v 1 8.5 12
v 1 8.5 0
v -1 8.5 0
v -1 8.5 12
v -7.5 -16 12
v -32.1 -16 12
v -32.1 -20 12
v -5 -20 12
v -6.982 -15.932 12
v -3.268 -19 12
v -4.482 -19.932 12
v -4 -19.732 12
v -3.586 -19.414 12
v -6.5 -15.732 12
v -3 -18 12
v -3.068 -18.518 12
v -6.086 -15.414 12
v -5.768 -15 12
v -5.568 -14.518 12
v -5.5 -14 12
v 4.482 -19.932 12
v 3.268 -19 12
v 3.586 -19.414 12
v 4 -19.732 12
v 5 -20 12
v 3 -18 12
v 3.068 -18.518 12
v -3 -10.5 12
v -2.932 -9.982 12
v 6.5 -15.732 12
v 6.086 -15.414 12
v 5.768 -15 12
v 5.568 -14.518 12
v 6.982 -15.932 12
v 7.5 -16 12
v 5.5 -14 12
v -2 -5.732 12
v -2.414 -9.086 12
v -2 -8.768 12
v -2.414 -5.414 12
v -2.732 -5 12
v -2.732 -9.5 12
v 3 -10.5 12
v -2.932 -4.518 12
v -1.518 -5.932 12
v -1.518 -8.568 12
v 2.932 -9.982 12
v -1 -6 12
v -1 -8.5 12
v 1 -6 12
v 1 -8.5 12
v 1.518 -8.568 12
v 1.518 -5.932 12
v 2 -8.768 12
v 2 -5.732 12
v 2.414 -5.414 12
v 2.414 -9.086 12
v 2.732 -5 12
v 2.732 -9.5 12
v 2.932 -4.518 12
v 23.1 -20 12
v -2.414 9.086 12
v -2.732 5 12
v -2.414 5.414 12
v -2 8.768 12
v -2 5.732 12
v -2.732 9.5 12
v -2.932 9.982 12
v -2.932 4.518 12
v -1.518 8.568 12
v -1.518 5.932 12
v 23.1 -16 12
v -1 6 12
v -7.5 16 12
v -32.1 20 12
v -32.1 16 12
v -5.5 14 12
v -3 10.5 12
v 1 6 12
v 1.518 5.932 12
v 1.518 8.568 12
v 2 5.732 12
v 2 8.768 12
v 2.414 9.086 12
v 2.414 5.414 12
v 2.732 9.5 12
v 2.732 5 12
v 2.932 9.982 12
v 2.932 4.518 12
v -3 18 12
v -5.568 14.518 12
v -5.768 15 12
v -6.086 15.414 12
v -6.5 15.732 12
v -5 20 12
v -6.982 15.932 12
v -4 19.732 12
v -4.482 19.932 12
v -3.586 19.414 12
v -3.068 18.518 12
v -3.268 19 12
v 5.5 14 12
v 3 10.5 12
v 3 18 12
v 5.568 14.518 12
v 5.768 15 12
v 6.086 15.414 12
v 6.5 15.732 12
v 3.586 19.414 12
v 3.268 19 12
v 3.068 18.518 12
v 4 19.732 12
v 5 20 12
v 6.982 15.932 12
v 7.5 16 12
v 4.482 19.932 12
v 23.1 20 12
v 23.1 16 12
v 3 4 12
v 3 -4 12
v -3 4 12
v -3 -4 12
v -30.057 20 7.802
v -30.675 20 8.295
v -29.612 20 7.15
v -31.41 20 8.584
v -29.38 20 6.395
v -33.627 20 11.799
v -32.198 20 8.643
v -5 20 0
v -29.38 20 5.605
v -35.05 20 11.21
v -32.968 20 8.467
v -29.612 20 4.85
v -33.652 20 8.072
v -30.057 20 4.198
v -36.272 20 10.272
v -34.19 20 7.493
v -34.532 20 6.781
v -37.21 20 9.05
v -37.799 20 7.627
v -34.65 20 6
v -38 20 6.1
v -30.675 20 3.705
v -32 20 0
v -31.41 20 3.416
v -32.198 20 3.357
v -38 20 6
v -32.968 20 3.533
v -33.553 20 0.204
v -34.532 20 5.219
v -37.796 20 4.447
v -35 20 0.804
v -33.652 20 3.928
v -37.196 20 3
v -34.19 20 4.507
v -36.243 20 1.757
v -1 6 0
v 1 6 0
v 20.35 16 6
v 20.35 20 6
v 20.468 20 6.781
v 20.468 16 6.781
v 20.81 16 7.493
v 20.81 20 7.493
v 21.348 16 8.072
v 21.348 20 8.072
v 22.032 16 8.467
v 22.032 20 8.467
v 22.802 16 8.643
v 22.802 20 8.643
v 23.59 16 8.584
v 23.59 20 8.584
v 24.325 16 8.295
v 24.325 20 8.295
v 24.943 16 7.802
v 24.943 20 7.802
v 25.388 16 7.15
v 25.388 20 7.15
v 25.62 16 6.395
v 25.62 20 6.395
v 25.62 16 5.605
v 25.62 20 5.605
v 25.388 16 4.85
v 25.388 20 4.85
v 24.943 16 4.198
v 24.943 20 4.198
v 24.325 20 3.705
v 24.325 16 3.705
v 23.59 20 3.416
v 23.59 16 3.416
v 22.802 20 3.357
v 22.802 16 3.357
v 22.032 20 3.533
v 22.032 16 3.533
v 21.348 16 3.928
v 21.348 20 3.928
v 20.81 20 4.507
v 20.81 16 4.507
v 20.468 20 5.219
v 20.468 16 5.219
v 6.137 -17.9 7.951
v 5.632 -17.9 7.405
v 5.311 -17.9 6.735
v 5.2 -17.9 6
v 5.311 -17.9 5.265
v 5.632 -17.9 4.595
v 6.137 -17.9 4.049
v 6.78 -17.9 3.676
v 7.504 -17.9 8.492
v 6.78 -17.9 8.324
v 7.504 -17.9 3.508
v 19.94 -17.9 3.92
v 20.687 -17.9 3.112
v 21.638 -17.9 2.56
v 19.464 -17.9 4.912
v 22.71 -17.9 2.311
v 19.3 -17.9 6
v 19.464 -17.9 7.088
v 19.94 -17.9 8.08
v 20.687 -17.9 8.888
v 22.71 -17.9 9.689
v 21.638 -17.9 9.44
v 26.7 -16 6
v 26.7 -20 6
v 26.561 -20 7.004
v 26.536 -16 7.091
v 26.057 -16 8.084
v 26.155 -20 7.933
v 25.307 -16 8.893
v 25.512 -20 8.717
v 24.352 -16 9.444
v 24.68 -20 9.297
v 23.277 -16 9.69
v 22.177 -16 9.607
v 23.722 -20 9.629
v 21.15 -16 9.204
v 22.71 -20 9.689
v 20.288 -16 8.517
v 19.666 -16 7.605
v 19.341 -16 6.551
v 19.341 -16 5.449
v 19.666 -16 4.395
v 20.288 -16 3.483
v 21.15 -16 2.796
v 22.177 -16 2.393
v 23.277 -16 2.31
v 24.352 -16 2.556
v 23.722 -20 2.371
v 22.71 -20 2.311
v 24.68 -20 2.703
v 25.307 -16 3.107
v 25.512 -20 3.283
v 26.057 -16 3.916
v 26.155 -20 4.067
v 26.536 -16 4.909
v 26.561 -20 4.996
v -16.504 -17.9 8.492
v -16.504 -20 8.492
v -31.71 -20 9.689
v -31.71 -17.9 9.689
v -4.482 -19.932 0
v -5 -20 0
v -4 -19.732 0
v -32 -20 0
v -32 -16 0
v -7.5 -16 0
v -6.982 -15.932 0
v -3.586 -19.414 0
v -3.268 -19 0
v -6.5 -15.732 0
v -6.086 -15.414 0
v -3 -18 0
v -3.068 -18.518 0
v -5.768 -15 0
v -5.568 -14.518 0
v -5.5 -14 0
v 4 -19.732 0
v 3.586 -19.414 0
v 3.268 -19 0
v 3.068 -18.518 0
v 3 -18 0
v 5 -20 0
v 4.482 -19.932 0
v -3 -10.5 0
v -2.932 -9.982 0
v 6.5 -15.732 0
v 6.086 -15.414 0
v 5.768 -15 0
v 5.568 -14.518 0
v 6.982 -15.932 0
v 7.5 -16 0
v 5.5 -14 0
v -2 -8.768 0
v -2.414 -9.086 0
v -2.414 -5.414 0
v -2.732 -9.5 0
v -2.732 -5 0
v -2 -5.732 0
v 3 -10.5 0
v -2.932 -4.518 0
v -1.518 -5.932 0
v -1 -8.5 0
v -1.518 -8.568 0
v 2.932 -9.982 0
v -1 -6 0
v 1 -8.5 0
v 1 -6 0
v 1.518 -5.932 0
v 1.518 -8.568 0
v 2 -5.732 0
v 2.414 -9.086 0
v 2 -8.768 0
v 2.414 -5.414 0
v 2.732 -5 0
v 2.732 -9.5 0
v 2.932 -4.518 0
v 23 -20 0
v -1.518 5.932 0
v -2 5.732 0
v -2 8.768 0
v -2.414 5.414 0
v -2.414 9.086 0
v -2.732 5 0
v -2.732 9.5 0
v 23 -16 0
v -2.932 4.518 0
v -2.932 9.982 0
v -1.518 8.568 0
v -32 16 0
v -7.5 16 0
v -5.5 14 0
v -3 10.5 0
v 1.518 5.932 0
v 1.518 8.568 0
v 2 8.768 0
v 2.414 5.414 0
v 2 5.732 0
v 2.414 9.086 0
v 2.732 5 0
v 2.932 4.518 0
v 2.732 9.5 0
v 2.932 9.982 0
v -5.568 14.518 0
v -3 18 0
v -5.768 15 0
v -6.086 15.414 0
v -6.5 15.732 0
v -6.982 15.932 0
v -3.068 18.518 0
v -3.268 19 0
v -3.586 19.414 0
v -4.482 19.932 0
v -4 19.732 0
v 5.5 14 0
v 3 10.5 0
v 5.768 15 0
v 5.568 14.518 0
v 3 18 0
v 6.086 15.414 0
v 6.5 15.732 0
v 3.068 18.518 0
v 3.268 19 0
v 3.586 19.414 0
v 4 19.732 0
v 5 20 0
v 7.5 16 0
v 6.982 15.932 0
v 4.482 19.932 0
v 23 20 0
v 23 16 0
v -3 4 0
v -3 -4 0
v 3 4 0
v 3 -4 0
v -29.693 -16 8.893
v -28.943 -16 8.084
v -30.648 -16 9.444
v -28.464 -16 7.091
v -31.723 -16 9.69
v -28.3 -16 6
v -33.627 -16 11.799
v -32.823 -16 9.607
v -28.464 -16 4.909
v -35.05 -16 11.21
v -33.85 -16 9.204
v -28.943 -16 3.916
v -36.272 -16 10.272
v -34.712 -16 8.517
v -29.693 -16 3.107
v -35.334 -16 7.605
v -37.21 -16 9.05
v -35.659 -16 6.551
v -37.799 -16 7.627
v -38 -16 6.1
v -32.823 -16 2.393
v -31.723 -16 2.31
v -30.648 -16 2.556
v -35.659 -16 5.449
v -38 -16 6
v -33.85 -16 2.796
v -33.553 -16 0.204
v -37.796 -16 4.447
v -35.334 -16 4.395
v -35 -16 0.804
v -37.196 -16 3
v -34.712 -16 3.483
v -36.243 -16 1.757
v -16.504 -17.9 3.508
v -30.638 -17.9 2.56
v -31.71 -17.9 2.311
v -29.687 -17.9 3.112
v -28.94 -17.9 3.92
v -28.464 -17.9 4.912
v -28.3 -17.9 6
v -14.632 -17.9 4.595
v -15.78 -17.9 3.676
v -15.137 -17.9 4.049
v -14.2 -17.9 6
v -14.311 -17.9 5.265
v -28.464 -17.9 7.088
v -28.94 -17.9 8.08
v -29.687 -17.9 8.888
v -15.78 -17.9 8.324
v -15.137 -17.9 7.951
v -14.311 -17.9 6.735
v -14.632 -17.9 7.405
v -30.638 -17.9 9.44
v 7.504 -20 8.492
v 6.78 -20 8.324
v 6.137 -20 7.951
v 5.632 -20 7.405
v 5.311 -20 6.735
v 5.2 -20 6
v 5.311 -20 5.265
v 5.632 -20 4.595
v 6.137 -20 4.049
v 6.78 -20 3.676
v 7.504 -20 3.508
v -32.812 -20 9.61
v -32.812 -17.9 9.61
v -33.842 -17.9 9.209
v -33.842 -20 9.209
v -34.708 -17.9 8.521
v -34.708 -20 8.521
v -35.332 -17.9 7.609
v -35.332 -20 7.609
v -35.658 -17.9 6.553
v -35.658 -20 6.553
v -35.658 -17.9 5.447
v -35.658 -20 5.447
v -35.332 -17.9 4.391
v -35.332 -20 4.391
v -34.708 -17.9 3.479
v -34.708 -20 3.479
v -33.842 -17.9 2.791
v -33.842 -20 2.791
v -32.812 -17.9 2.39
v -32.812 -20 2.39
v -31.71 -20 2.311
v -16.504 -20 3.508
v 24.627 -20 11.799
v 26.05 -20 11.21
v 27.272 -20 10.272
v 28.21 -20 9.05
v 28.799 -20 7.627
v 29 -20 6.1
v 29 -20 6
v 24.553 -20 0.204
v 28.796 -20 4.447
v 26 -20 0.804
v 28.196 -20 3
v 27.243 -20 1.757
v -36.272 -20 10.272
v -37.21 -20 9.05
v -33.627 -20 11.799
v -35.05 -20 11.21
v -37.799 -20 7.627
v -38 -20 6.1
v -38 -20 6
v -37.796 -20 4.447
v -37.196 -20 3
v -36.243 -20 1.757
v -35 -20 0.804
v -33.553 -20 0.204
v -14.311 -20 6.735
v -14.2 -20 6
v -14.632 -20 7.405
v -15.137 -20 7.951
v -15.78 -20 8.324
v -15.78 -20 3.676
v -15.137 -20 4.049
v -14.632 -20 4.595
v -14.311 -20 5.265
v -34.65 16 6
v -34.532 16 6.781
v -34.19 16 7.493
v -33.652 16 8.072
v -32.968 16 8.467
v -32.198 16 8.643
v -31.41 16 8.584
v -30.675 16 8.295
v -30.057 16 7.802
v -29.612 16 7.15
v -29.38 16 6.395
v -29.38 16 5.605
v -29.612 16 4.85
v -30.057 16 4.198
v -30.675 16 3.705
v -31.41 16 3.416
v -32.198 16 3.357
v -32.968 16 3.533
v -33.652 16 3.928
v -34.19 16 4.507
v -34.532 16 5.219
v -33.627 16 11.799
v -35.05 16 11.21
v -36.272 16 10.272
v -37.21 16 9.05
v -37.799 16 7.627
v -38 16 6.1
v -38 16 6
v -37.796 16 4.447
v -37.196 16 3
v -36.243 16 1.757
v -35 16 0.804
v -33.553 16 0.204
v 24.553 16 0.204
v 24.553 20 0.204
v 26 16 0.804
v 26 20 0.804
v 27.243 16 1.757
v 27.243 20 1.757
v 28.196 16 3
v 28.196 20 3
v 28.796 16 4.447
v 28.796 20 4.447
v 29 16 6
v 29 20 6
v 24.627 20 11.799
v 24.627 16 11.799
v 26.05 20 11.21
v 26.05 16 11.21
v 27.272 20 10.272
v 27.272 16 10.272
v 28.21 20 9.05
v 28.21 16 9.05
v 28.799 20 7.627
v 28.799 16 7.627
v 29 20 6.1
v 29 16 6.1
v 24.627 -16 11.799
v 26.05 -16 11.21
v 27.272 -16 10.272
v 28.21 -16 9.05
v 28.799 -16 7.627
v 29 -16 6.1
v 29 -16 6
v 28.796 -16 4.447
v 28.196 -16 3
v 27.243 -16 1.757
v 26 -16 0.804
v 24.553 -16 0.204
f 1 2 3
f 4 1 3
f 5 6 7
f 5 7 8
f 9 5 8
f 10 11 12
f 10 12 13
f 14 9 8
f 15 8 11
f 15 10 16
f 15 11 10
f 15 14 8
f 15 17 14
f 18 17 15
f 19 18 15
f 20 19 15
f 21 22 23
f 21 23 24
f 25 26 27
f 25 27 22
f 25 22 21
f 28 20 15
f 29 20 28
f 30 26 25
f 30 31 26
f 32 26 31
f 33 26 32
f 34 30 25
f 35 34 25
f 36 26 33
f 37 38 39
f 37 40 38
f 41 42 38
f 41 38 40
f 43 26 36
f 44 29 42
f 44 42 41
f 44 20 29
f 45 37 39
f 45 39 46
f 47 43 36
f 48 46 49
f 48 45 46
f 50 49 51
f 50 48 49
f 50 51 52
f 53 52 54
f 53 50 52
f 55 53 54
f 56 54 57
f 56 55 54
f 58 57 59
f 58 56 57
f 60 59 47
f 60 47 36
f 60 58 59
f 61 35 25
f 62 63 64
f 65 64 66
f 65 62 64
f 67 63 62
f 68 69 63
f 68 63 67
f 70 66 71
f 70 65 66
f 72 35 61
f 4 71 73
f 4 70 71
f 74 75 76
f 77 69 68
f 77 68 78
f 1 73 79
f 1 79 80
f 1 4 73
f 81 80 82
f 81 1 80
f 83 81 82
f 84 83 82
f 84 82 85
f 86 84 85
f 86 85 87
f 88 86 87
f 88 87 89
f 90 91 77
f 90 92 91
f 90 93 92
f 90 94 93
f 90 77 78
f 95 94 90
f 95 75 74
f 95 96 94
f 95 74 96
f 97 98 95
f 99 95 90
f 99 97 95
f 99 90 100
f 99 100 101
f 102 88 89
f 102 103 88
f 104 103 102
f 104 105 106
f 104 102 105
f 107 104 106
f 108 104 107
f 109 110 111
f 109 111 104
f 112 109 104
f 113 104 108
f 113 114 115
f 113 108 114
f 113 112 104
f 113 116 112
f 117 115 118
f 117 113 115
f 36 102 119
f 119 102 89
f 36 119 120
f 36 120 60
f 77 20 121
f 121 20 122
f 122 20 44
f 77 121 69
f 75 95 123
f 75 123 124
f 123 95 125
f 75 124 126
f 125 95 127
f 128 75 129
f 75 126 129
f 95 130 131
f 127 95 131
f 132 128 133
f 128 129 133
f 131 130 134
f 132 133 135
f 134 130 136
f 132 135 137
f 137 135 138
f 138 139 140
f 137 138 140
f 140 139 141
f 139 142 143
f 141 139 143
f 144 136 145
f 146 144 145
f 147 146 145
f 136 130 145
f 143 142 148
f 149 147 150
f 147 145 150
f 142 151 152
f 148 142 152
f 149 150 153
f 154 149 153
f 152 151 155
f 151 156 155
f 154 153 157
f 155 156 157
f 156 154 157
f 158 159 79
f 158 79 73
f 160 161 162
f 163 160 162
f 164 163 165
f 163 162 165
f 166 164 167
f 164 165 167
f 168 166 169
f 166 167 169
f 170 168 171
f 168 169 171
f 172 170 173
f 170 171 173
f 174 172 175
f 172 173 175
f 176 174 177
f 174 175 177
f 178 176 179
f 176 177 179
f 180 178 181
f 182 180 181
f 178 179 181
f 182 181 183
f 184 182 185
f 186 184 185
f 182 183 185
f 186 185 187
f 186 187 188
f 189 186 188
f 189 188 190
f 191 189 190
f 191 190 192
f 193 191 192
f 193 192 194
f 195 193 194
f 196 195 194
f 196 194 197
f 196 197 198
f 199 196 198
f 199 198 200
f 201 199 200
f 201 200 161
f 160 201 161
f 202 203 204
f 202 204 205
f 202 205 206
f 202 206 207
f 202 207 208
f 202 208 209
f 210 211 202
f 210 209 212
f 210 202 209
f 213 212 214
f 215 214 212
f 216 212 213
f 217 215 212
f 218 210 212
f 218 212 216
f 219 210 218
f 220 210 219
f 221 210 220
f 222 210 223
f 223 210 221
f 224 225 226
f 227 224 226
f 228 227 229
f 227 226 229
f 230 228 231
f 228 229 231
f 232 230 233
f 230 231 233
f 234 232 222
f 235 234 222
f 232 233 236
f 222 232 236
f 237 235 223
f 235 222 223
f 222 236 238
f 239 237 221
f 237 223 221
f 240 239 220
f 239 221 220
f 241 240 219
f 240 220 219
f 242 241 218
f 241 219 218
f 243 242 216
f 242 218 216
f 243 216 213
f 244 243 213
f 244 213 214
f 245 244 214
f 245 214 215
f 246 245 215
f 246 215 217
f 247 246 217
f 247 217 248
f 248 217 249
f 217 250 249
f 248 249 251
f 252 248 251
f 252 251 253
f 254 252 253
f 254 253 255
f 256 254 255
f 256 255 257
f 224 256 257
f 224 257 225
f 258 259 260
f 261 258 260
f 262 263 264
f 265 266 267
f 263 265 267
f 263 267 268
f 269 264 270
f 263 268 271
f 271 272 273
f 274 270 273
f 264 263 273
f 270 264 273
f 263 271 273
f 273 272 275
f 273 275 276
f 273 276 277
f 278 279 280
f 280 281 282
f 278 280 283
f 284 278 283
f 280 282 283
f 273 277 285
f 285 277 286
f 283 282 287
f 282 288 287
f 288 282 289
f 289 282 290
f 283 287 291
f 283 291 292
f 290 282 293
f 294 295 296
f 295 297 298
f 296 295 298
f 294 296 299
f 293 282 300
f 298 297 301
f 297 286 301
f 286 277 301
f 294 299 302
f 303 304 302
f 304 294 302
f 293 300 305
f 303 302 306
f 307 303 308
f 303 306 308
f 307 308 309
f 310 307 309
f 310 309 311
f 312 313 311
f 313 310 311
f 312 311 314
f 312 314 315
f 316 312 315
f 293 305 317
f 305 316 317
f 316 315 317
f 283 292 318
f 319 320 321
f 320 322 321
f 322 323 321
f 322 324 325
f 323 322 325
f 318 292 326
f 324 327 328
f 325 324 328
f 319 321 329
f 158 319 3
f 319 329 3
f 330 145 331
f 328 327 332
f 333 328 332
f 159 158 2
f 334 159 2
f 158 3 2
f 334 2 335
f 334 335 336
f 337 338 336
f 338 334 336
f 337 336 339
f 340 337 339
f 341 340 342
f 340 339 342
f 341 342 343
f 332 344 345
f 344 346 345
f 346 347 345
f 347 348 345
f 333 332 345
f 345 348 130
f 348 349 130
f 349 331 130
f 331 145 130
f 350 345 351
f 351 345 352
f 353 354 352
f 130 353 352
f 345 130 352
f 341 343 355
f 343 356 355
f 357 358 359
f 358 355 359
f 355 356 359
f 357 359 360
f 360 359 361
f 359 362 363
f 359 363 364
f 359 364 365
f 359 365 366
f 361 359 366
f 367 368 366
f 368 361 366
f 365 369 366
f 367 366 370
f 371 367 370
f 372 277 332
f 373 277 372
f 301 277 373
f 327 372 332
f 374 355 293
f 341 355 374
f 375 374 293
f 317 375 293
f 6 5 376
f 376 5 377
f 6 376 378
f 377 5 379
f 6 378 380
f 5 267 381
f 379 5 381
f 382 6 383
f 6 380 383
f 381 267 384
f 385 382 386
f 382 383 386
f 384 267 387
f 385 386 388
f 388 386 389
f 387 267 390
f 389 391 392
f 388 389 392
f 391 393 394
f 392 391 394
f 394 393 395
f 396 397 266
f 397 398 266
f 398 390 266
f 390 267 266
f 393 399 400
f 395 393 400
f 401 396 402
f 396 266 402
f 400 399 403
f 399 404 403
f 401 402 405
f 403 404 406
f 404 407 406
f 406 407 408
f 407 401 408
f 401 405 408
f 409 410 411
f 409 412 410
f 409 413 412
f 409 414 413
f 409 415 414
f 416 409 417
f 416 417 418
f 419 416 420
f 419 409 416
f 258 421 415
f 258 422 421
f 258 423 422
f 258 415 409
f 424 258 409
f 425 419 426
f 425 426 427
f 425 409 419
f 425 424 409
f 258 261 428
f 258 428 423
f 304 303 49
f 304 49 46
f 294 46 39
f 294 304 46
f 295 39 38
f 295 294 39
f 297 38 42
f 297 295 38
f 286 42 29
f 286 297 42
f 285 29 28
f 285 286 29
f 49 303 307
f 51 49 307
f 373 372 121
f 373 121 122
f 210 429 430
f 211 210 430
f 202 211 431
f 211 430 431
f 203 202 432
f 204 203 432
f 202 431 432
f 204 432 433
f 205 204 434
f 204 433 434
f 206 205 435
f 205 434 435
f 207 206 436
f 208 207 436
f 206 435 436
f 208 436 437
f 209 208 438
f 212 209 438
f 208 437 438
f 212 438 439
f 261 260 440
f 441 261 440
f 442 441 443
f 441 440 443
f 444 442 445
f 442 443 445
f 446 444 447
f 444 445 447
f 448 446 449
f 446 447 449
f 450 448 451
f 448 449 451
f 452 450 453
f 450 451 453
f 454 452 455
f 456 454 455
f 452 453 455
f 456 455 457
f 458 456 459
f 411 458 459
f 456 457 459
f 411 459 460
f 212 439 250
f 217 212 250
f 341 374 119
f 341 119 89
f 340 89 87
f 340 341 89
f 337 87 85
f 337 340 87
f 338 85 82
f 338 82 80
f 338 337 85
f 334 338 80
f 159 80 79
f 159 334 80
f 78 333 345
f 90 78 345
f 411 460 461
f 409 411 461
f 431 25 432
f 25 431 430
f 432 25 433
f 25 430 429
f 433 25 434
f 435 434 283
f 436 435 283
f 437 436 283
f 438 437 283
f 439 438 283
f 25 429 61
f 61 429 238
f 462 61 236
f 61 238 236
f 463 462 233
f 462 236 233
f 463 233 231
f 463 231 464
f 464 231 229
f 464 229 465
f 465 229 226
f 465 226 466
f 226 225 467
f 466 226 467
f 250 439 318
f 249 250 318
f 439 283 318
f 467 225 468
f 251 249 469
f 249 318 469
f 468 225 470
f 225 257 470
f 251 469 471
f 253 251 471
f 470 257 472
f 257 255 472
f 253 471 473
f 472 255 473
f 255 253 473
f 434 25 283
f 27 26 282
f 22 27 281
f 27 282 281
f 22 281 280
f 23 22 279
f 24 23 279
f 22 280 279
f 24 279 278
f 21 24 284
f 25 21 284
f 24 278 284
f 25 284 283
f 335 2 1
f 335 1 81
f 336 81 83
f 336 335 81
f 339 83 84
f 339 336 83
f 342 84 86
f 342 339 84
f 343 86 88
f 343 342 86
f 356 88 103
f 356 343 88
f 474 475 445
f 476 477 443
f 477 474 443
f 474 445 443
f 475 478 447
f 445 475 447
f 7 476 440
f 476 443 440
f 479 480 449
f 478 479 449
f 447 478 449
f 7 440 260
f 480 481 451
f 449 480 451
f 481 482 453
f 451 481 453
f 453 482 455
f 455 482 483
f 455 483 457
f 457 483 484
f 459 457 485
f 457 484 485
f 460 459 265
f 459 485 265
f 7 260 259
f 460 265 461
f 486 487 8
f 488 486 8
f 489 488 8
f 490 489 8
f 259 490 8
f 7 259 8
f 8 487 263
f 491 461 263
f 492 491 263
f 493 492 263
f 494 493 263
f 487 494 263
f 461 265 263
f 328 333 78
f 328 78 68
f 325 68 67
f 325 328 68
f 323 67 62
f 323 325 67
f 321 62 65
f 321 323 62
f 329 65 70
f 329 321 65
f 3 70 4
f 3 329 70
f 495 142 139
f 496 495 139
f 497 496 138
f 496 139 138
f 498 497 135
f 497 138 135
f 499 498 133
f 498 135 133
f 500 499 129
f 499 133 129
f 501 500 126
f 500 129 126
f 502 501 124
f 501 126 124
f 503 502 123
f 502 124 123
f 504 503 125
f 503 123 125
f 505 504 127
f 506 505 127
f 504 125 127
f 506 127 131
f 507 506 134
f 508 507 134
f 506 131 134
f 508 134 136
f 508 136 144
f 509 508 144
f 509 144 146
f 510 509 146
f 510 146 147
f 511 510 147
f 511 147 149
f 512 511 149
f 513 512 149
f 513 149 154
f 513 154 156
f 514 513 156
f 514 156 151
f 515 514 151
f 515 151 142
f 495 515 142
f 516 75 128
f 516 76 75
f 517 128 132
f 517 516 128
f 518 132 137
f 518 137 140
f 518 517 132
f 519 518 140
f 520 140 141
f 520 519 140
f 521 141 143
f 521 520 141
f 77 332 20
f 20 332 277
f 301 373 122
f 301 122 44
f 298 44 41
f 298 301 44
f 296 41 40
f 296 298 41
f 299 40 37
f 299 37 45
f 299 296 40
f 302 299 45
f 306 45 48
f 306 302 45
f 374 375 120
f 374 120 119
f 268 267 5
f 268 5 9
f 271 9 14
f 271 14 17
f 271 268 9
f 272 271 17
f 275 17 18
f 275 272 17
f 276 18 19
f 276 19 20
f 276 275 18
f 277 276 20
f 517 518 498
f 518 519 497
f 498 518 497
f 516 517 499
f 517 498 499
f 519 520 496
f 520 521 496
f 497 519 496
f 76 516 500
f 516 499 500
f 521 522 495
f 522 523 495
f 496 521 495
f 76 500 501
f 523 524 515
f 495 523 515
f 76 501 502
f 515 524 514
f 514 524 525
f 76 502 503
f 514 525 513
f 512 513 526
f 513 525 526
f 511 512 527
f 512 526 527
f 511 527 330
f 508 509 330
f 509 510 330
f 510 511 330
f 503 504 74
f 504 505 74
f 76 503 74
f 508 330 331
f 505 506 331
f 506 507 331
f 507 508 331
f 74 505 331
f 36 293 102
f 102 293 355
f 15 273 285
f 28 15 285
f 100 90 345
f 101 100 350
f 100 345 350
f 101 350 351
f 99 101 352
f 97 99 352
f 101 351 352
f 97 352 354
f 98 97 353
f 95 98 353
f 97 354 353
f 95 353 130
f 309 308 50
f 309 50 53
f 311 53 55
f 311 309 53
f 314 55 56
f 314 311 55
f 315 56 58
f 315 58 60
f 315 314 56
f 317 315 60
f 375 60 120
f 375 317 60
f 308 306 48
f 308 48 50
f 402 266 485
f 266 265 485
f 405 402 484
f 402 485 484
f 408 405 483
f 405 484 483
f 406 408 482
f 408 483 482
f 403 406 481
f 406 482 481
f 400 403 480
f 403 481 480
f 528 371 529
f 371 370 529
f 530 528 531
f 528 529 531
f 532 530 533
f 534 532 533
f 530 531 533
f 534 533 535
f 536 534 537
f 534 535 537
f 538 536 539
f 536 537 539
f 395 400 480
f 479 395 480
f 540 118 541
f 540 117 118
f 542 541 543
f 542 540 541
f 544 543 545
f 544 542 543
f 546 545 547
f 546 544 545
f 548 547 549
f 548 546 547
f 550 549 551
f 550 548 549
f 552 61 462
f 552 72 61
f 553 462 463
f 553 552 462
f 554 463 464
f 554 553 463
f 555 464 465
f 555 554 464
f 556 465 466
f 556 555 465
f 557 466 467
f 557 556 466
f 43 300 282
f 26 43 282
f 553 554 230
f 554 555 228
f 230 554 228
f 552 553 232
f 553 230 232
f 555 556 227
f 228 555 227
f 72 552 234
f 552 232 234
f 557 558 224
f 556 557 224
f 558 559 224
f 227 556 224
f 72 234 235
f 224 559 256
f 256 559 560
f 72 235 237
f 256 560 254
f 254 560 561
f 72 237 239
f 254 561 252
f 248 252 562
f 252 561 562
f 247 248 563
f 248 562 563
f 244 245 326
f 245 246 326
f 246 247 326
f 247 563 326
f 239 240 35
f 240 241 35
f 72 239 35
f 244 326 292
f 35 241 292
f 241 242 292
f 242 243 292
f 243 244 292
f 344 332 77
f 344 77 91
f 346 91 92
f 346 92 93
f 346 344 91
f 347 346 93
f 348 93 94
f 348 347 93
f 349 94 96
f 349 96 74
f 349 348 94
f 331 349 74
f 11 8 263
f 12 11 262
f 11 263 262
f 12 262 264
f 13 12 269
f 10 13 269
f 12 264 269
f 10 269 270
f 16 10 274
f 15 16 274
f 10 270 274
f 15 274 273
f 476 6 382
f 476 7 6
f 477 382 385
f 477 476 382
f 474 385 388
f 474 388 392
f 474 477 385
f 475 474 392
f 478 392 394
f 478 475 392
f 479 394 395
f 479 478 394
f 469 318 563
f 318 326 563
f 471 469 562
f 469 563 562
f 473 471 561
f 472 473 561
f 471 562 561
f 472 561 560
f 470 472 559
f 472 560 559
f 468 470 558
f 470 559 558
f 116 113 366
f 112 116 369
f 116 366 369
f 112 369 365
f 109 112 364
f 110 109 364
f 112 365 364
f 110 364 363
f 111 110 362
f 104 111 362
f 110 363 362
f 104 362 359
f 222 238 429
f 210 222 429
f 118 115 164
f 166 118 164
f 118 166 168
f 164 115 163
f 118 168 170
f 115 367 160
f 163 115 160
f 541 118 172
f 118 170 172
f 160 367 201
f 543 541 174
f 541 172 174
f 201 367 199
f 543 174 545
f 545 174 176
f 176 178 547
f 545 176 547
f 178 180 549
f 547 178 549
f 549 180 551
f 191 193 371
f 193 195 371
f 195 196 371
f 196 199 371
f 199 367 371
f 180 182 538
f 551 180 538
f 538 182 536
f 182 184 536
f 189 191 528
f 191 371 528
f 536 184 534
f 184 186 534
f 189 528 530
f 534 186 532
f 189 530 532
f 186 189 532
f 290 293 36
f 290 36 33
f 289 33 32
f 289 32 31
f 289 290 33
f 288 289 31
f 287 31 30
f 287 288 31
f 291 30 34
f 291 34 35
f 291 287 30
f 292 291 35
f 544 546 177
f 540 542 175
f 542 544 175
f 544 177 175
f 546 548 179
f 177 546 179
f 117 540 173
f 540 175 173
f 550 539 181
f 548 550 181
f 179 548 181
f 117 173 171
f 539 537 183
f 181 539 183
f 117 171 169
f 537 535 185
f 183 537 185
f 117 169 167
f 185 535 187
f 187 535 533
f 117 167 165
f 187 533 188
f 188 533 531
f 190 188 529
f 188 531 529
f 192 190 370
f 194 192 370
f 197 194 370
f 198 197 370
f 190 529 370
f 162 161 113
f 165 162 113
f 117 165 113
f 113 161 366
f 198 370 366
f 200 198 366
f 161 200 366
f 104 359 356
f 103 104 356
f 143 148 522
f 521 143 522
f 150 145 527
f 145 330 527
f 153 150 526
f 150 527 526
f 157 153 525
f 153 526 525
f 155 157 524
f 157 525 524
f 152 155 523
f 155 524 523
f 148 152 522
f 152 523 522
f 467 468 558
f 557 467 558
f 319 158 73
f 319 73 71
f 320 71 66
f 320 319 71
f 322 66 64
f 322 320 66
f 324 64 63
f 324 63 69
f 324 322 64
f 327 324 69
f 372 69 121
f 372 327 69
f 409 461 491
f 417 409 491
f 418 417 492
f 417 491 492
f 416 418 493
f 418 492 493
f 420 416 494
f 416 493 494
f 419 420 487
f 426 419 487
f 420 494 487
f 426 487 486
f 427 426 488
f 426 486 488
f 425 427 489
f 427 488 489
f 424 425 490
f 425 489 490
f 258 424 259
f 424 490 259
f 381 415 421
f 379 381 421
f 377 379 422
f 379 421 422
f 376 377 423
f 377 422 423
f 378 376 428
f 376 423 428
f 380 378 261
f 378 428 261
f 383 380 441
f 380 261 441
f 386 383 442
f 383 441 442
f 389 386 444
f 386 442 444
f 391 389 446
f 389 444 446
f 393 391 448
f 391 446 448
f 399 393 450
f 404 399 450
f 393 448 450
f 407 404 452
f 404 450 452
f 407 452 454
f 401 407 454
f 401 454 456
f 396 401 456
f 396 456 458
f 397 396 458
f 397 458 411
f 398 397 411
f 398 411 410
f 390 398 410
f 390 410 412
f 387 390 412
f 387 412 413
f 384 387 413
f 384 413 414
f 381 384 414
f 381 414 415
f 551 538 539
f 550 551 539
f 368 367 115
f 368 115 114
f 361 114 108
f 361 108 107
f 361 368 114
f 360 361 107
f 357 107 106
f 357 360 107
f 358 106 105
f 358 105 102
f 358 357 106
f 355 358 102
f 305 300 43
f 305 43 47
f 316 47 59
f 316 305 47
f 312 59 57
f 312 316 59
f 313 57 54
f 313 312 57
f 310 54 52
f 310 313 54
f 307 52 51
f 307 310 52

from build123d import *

# Parameters (mm, degrees)
PAD_DEPTH       = 12
SKETCH001_R     = 3.7
POCKET_DEPTH    = 5
POCKET001_DEPTH = 2.1
SKETCH003_R     = 2.65
POCKET002_DEPTH = 5
FILLET_R        = 6
FILLET001_R     = 6
FILLET002_R     = 6
FILLET003_R     = 6
FILLET004_R     = 5.9
FILLET005_R     = 5.9
FILLET006_R     = 5.9
FILLET007_R     = 5.9


with BuildPart() as part:
    # Sketch → Pad (new body)
    with BuildSketch(Plane.XY):
        with BuildLine():
            Line((-3, 10.5), (-3, 18))
            ThreePointArc((-3, 18), (-3.585786, 19.414214), (-5, 20))
            Line((-5, 20), (-38, 20))
            Line((-38, 20), (-38, 16))
            Line((-38, 16), (-7.5, 16))
            ThreePointArc((-5.5, 14), (-6.085786, 15.414214), (-7.5, 16))
            Line((-5.5, 14), (-5.5, -14))
            ThreePointArc((-7.5, -16), (-6.085786, -15.414214), (-5.5, -14))
            Line((-7.5, -16), (-38, -16))
            Line((-38, -16), (-38, -20))
            Line((-38, -20), (-5, -20))
            ThreePointArc((-5, -20), (-3.585786, -19.414214), (-3, -18))
            Line((-3, -18), (-3, -10.5))
            ThreePointArc((-1, -8.5), (-2.414214, -9.085786), (-3, -10.5))
            Line((-1, -8.5), (1, -8.5))
            ThreePointArc((3, -10.5), (2.414214, -9.085786), (1, -8.5))
            Line((3, -10.5), (3, -18))
            ThreePointArc((3, -18), (3.585786, -19.414214), (5, -20))
            Line((5, -20), (29, -20))
            Line((29, -20), (29, -16))
            Line((29, -16), (7.5, -16))
            ThreePointArc((5.5, -14), (6.085786, -15.414214), (7.5, -16))
            Line((5.5, -14), (5.5, 14))
            ThreePointArc((7.5, 16), (6.085786, 15.414214), (5.5, 14))
            Line((7.5, 16), (29, 16))
            Line((29, 16), (29, 20))
            Line((29, 20), (5, 20))
            ThreePointArc((5, 20), (3.585786, 19.414214), (3, 18))
            Line((3, 18), (3, 10.5))
            ThreePointArc((1, 8.5), (2.414214, 9.085786), (3, 10.5))
            Line((1, 8.5), (-1, 8.5))
            ThreePointArc((-3, 10.5), (-2.414214, 9.085786), (-1, 8.5))
        make_face()
        with BuildLine():
            Line((3, -4), (3, 4))
            ThreePointArc((3, 4), (2.414214, 5.414214), (1, 6))
            Line((1, 6), (-1, 6))
            ThreePointArc((-1, 6), (-2.414214, 5.414214), (-3, 4))
            Line((-3, 4), (-3, -4))
            ThreePointArc((-3, -4), (-2.414214, -5.414214), (-1, -6))
            Line((-1, -6), (1, -6))
            ThreePointArc((1, -6), (2.414214, -5.414214), (3, -4))
        make_face(mode=Mode.SUBTRACT)
    extrude(amount=PAD_DEPTH)

    # Sketch001 (on Face11 of Pad) → Pocket (cut)
    with BuildSketch(Plane.XZ.offset(20)):
        with Locations((-32, 6)):
            Circle(SKETCH001_R)
        with Locations((23, 6)):
            Circle(SKETCH001_R)
    extrude(amount=-POCKET_DEPTH, mode=Mode.SUBTRACT)

    # Sketch002 (on Face23 of Pocket) → Pocket001 (cut)
    with BuildSketch(Plane.XZ.offset(20)):
        with BuildLine():
            ThreePointArc((-31.709804, 9.688602), (-35.7, 6), (-31.709804, 2.311398))
            Line((-31.709804, 2.311398), (-16.503922, 3.507701))
            ThreePointArc((-16.503922, 3.507701), (-14.2, 6), (-16.503922, 8.492299))
            Line((-16.503922, 8.492299), (-31.709804, 9.688602))
        make_face()
        with BuildLine():
            ThreePointArc((22.709804, 2.311398), (26.7, 6), (22.709804, 9.688602))
            Line((22.709804, 9.688602), (7.503922, 8.492299))
            ThreePointArc((7.503922, 8.492299), (5.2, 6), (7.503922, 3.507701))
            Line((7.503922, 3.507701), (22.709804, 2.311398))
        make_face()
    extrude(amount=-POCKET001_DEPTH, mode=Mode.SUBTRACT)

    # Sketch003 (on Face31 of Pocket001) → Pocket002 (cut)
    with BuildSketch(Plane(origin=(0, 20, 0), x_dir=(-1, 0, 0), z_dir=(0, 1, 0))):
        with Locations((-23, 6)):
            Circle(SKETCH003_R)
        with Locations((32, 6)):
            Circle(SKETCH003_R)
    extrude(amount=-POCKET002_DEPTH, mode=Mode.SUBTRACT)

    # Fillet
    fillet_edges = [part.edges().sort_by_distance(p)[0] for p in [
        (29, 18, 0),
    ]]
    fillet(fillet_edges, radius=FILLET_R)

    # Fillet001
    fillet001_edges = [part.edges().sort_by_distance(p)[0] for p in [
        (29, -18, 0),
    ]]
    fillet(fillet001_edges, radius=FILLET001_R)

    # Fillet002
    fillet002_edges = [part.edges().sort_by_distance(p)[0] for p in [
        (-38, -18, 0),
    ]]
    fillet(fillet002_edges, radius=FILLET002_R)

    # Fillet003
    fillet003_edges = [part.edges().sort_by_distance(p)[0] for p in [
        (-38, 18, 0),
    ]]
    fillet(fillet003_edges, radius=FILLET003_R)

    # Fillet004
    fillet004_edges = [part.edges().sort_by_distance(p)[0] for p in [
        (29, -18, 12),
    ]]
    fillet(fillet004_edges, radius=FILLET004_R)

    # Fillet005
    fillet005_edges = [part.edges().sort_by_distance(p)[0] for p in [
        (29, 18, 12),
    ]]
    fillet(fillet005_edges, radius=FILLET005_R)

    # Fillet006
    fillet006_edges = [part.edges().sort_by_distance(p)[0] for p in [
        (-38, 18, 12),
    ]]
    fillet(fillet006_edges, radius=FILLET006_R)

    # Fillet007
    fillet007_edges = [part.edges().sort_by_distance(p)[0] for p in [
        (-38, -18, 12),
    ]]
    fillet(fillet007_edges, radius=FILLET007_R)


solid = part.part
